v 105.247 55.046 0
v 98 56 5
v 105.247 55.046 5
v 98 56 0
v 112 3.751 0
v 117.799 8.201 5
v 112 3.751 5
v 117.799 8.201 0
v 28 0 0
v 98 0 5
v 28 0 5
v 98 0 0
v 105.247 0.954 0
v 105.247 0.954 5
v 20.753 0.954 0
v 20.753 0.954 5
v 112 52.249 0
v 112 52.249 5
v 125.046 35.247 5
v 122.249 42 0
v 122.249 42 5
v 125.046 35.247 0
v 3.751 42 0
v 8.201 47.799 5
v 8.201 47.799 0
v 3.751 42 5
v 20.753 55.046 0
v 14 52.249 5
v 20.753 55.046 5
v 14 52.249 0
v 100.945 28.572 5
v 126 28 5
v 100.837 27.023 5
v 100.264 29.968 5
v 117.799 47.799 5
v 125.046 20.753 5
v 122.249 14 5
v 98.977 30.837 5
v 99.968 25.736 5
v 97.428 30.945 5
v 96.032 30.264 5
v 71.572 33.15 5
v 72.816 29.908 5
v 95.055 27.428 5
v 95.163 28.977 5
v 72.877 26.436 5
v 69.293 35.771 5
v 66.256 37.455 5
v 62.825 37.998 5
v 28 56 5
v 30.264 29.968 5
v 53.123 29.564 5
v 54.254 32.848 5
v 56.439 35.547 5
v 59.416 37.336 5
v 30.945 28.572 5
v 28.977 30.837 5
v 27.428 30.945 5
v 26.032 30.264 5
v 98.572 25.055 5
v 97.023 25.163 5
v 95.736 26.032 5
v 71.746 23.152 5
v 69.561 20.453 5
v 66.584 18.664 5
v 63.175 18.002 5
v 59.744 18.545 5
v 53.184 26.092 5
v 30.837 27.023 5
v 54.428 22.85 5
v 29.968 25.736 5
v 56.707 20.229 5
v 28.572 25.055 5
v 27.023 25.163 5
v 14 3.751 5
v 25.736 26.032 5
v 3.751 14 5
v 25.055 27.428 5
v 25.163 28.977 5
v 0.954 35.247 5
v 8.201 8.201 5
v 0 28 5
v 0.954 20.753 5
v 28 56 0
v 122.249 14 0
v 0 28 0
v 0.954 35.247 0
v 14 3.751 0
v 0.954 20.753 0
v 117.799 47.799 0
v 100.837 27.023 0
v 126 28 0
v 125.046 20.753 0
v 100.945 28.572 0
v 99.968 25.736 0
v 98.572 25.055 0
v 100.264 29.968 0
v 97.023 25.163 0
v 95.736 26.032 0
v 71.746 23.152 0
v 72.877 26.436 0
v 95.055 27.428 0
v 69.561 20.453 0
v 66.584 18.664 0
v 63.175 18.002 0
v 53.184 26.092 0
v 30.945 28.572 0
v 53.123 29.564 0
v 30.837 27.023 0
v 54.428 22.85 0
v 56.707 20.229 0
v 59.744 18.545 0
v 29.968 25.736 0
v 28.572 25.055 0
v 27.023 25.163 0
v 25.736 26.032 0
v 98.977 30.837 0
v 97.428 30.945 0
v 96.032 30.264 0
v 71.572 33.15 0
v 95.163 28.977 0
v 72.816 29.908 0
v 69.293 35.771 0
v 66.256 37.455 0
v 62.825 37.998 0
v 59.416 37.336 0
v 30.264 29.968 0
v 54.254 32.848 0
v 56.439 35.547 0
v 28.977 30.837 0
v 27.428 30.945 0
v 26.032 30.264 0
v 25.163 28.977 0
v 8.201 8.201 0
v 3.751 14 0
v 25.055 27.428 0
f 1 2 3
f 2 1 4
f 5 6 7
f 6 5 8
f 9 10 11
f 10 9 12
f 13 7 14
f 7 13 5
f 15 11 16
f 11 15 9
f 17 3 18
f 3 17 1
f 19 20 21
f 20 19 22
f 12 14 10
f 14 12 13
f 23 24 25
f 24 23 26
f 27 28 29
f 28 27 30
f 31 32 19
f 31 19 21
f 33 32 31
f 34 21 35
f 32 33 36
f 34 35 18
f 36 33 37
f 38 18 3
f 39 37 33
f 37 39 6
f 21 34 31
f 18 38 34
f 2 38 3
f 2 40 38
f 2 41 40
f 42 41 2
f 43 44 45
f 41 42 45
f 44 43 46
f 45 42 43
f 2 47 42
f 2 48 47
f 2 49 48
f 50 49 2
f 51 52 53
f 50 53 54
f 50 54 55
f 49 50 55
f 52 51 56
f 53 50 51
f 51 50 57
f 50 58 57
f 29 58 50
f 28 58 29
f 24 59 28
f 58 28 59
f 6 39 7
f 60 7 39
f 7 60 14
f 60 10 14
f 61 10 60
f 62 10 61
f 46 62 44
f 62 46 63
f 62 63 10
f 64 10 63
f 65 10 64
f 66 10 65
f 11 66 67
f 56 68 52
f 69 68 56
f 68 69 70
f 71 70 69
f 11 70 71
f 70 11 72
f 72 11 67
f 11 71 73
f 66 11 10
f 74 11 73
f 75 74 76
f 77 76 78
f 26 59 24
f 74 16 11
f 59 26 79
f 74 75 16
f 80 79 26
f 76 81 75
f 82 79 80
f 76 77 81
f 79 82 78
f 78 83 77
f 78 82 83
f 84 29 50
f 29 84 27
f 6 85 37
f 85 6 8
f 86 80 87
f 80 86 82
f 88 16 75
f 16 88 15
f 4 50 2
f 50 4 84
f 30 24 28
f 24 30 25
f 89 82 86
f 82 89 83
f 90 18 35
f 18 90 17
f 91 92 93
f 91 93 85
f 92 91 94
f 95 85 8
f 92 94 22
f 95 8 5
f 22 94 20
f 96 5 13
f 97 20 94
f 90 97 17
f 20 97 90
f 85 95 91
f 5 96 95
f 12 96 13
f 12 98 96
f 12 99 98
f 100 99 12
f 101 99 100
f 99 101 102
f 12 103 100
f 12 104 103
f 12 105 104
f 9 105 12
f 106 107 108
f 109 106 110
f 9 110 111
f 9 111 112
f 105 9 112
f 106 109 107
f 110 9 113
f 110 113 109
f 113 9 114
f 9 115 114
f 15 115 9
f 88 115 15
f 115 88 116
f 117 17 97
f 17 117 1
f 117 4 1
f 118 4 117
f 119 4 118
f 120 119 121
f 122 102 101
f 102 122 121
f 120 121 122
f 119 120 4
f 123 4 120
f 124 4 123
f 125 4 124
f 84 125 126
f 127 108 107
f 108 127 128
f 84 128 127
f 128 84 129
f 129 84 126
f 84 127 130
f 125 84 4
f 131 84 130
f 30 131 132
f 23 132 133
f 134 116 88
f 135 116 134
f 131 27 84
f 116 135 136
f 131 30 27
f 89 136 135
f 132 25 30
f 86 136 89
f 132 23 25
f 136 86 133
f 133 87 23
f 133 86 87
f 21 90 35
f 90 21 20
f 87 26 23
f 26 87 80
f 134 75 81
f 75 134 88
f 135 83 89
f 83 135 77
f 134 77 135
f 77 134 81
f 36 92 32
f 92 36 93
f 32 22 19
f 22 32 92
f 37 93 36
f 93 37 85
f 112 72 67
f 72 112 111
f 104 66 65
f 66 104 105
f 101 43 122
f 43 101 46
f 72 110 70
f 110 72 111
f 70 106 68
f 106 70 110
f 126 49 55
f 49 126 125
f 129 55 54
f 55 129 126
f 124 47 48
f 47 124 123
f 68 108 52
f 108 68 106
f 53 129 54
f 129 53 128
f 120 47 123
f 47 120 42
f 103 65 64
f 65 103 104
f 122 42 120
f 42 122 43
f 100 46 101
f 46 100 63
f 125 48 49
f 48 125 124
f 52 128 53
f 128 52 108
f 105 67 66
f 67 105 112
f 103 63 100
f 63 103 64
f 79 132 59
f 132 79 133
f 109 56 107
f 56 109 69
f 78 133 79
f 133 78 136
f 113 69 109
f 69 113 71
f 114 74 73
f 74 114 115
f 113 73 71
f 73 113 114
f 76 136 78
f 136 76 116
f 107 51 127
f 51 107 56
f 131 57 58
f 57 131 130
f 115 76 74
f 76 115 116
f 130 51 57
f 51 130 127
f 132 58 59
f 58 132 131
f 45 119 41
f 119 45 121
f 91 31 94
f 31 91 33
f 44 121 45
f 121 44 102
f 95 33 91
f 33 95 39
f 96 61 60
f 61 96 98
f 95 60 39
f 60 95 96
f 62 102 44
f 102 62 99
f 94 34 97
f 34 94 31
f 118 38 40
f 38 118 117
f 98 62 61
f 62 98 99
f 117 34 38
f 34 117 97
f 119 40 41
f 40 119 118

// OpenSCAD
$fn = 32;

// ----------------------------------------------------------------------
// Spacer plate: obround span 70, caps R28
// ----------------------------------------------------------------------

// --- parameters (mm) ---
bore_r = 10;              // centre bore radius
bolt_r = 3;               // bolt hole radius
plate_t = 5;              // plate thickness, Z (extrusion height)
span = 70;                // obround span
cap_r = 28;               // cap radius

profile = [[28, 56], [20.753, 55.046], [14, 52.249], [8.201, 47.799], [3.751, 42], [0.954, 35.247], [0, 28], [0.954, 20.753], [3.751, 14], [8.201, 8.201], [14, 3.751], [20.753, 0.954], [28, 0], [98, 0], [105.247, 0.954], [112, 3.751], [117.799, 8.201], [122.249, 14], [125.046, 20.753], [126, 28], [125.046, 35.247], [122.249, 42], [117.799, 47.799], [112, 52.249], [105.247, 55.046], [98, 56]];  // primary outline, 26 points, counter clockwise
void_1 = [[72.816, 29.908], [71.572, 33.15], [69.293, 35.771], [66.256, 37.455], [62.825, 37.998], [59.416, 37.336], [56.439, 35.547], [54.254, 32.848], [53.123, 29.564], [53.184, 26.092], [54.428, 22.85], [56.707, 20.229], [59.744, 18.545], [63.175, 18.002], [66.584, 18.664], [69.561, 20.453], [71.746, 23.152], [72.877, 26.436]];  // centre bore, 18 points
void_2 = [[30.945, 28.572], [30.264, 29.968], [28.977, 30.837], [27.428, 30.945], [26.032, 30.264], [25.163, 28.977], [25.055, 27.428], [25.736, 26.032], [27.023, 25.163], [28.572, 25.055], [29.968, 25.736], [30.837, 27.023]];  // end hole, 12 points
void_3 = [[100.945, 28.572], [100.264, 29.968], [98.977, 30.837], [97.428, 30.945], [96.032, 30.264], [95.163, 28.977], [95.055, 27.428], [95.736, 26.032], [97.023, 25.163], [98.572, 25.055], [99.968, 25.736], [100.837, 27.023]];  // end hole, 12 points

// --- the one profile operation ---
difference() {
  linear_extrude(height = plate_t) polygon(points = profile);
  translate([0, 0, -1])
    linear_extrude(height = plate_t + 2) polygon(points = void_1);
  translate([0, 0, -1])
    linear_extrude(height = plate_t + 2) polygon(points = void_2);
  translate([0, 0, -1])
    linear_extrude(height = plate_t + 2) polygon(points = void_3);
}
